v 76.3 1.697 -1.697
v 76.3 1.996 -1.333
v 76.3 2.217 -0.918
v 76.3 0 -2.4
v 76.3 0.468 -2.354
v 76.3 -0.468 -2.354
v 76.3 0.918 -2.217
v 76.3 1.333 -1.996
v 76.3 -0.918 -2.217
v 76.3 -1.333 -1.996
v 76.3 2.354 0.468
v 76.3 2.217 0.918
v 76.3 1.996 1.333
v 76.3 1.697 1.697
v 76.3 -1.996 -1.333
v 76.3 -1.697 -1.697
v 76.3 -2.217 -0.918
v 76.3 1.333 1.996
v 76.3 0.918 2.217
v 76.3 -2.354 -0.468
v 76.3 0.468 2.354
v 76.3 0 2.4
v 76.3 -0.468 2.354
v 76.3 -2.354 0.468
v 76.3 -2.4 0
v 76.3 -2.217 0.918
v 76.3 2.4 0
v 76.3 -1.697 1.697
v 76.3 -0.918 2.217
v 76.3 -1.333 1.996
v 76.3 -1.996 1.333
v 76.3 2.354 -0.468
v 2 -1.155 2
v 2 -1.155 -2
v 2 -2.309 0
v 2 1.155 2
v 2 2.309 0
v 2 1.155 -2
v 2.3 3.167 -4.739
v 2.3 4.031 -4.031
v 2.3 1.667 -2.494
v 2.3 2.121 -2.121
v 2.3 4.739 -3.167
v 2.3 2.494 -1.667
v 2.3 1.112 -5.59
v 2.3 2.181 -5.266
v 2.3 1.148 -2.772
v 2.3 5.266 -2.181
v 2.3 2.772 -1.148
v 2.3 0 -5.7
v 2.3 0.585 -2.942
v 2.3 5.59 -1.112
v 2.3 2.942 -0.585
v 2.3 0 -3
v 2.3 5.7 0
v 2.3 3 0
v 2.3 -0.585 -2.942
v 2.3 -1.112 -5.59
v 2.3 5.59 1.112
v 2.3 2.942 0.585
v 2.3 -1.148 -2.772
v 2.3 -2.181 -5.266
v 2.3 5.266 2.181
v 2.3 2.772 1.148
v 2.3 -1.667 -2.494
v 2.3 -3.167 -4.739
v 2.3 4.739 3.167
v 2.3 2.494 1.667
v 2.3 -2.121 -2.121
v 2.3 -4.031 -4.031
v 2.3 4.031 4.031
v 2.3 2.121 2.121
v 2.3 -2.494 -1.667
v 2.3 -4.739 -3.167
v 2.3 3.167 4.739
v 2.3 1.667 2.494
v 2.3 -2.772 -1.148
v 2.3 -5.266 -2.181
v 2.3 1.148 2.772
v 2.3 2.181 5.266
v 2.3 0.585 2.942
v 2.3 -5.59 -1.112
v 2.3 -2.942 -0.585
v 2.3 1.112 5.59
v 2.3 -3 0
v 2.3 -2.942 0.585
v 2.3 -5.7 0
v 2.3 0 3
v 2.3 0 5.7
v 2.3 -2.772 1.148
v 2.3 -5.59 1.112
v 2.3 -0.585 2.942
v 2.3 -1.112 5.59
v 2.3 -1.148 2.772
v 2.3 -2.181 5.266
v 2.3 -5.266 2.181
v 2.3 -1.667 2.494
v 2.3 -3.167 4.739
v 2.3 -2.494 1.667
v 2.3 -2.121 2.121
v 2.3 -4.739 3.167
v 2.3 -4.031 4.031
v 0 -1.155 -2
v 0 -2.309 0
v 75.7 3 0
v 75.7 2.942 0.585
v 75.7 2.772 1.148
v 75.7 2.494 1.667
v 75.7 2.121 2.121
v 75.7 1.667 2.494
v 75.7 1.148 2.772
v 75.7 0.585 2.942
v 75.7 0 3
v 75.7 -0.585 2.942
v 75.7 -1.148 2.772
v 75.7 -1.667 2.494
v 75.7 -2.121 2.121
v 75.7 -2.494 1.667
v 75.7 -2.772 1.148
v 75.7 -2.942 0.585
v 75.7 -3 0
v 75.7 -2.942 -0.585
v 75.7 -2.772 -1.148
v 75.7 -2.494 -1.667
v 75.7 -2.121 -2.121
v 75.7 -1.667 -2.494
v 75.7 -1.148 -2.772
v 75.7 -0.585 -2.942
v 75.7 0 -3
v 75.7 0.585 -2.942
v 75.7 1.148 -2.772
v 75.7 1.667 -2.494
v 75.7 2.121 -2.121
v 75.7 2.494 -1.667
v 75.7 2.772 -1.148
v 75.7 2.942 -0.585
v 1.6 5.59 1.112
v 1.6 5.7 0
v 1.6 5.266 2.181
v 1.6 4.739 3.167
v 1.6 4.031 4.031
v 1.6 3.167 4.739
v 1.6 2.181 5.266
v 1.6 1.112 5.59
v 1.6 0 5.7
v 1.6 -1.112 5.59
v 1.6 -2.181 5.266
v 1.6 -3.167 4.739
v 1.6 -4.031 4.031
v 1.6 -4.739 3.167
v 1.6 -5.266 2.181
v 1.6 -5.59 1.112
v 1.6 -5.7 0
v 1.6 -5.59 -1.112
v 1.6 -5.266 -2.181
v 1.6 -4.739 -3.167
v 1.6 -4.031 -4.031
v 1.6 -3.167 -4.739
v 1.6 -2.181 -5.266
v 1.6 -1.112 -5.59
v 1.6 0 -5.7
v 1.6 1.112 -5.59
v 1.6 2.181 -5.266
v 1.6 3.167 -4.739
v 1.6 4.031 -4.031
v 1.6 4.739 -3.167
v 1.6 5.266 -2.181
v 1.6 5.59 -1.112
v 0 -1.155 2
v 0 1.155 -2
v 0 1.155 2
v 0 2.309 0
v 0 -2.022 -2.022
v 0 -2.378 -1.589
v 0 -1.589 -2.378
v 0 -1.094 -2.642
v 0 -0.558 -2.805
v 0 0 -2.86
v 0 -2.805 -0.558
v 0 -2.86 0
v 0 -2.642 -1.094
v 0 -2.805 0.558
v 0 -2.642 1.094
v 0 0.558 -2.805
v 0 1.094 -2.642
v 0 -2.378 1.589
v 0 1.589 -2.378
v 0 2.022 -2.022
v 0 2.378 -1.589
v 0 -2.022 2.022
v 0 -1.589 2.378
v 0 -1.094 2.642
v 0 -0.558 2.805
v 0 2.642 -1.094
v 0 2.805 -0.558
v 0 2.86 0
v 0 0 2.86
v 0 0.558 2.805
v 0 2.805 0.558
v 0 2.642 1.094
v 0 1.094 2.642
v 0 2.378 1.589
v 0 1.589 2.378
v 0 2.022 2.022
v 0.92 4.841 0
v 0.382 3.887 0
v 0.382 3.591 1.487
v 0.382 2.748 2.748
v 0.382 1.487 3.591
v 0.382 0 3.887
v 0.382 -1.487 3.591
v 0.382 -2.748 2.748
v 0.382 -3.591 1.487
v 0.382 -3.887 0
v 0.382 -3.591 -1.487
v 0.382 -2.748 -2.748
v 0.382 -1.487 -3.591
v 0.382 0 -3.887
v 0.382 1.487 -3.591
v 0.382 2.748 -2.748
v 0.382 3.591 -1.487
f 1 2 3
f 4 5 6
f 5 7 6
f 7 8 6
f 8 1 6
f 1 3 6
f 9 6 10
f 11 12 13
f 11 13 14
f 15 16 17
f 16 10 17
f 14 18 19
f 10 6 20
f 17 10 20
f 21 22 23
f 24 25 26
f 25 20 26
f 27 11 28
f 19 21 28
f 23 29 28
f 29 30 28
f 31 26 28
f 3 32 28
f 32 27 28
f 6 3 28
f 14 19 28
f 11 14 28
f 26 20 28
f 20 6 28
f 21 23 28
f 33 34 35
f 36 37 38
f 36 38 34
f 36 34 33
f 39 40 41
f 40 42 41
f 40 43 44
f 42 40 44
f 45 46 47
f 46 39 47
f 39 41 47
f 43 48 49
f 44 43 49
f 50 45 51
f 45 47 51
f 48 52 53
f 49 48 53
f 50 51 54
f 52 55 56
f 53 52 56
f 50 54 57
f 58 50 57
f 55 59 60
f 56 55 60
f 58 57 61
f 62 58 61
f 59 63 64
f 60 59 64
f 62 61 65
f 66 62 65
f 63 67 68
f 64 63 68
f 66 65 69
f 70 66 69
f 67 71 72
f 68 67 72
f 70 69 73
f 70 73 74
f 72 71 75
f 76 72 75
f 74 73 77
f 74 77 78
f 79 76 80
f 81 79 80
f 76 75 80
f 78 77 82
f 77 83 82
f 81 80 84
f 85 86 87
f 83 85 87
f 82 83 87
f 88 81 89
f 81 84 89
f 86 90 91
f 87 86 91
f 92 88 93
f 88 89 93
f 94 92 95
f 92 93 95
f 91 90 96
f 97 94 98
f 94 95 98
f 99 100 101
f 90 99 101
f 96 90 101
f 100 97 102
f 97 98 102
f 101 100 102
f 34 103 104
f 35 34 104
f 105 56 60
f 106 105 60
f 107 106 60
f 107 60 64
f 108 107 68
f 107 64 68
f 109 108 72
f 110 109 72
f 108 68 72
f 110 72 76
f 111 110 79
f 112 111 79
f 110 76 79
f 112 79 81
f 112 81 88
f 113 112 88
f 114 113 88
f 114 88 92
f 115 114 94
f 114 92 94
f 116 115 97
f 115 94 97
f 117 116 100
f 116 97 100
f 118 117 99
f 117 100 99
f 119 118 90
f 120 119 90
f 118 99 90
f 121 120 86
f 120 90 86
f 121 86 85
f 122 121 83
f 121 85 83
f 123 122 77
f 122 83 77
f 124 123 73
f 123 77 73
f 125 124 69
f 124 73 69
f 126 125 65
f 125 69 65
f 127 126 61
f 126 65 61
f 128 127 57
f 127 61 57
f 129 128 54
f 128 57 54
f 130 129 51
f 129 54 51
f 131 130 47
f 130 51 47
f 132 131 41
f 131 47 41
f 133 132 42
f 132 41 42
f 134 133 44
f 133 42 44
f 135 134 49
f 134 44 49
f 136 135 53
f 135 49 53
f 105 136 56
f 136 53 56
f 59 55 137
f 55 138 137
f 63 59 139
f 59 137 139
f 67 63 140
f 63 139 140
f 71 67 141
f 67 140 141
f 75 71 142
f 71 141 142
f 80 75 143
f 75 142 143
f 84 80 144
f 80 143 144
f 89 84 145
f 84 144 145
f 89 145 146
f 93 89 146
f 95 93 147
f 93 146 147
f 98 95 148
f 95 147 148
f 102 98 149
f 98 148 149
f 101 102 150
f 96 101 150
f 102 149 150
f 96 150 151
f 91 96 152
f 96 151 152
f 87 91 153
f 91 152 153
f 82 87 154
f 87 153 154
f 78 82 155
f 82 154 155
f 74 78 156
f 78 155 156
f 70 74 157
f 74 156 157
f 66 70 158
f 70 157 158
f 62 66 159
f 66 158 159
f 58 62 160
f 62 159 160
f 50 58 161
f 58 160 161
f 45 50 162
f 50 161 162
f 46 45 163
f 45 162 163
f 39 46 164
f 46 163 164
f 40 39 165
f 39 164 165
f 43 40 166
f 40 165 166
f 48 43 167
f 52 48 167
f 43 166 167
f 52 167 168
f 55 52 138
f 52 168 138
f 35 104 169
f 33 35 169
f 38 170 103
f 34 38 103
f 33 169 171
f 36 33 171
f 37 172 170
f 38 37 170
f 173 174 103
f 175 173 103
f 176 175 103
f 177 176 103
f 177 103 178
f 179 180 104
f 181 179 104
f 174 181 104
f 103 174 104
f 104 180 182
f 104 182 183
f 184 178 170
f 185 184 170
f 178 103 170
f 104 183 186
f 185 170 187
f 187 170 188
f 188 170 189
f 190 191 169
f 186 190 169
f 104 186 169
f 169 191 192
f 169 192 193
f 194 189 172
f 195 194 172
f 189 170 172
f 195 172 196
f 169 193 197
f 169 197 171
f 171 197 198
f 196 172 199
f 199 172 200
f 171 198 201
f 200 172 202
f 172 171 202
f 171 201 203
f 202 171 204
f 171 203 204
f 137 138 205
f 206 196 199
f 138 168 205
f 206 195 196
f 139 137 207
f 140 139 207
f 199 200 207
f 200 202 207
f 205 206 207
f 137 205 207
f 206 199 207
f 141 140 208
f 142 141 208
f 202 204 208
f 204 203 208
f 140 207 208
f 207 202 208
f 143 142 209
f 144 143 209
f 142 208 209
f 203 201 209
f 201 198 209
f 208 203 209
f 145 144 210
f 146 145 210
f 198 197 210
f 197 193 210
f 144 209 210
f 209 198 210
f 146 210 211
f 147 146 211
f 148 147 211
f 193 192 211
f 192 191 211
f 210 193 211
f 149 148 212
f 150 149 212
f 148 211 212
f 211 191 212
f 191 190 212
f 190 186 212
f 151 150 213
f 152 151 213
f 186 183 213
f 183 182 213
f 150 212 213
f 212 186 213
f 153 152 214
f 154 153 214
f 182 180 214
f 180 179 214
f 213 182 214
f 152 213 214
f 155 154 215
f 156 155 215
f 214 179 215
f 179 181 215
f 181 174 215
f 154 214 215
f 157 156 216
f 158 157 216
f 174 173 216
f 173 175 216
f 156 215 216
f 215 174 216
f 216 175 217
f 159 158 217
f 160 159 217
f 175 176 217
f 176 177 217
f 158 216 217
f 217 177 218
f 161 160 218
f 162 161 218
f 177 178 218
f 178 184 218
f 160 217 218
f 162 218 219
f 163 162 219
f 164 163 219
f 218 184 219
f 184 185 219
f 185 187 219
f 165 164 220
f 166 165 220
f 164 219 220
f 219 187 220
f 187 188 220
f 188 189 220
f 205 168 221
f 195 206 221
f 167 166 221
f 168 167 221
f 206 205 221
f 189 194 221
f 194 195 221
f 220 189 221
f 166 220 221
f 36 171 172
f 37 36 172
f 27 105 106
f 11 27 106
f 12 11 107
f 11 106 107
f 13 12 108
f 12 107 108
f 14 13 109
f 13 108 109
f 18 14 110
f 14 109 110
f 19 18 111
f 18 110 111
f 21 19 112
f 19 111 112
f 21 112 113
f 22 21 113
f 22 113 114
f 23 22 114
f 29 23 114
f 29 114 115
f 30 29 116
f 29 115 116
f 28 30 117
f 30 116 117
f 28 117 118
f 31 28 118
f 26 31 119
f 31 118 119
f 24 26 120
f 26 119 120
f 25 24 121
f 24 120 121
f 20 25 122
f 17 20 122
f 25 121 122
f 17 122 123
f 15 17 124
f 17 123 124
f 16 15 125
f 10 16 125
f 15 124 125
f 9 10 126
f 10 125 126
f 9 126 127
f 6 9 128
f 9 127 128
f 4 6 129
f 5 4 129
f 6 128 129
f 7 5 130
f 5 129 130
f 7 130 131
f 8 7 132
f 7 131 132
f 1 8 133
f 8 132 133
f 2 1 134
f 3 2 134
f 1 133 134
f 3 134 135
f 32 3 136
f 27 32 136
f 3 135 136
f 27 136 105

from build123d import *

# Parameters (mm, degrees)
CHAMFER1_SIZE      = 0.6
CUT_EXTRUDE1_DEPTH = 2


with BuildPart() as part:
    # Sketch1 → Revolve1 (revolve)
    with BuildSketch(Plane.XY):
        with BuildLine():
            Line((0, 0), (76.3, 0))
            Line((76.3, 0), (76.3, 3))
            Line((76.3, 3), (2.3, 3))
            Line((2.3, 3), (2.3, 5.7))
            Line((2.3, 5.7), (1.6, 5.7))
            ThreePointArc((1.6, 5.7), (0.632383618, 4.374431764), (0, 2.86))
            Line((0, 2.86), (0, 0))
        make_face()
    revolve(axis=Axis((0, 0, 0), (1, 0, 0)))

    # Chamfer1
    chamfer1_edges = [part.edges().sort_by_distance(p)[0] for p in [
        (76.3, -3, 0),
    ]]
    chamfer(chamfer1_edges, length=CHAMFER1_SIZE)

    # Sketch2 → Cut-Extrude1 (cut)
    with BuildSketch(Plane.ZY):
        Polygon((0, 2.309401077), (-2, 1.154700538), (-2, -1.154700538), (0, -2.309401077), (2, -1.154700538), (2, 1.154700538), align=None)
    extrude(amount=-CUT_EXTRUDE1_DEPTH, mode=Mode.SUBTRACT)


solid = part.part
